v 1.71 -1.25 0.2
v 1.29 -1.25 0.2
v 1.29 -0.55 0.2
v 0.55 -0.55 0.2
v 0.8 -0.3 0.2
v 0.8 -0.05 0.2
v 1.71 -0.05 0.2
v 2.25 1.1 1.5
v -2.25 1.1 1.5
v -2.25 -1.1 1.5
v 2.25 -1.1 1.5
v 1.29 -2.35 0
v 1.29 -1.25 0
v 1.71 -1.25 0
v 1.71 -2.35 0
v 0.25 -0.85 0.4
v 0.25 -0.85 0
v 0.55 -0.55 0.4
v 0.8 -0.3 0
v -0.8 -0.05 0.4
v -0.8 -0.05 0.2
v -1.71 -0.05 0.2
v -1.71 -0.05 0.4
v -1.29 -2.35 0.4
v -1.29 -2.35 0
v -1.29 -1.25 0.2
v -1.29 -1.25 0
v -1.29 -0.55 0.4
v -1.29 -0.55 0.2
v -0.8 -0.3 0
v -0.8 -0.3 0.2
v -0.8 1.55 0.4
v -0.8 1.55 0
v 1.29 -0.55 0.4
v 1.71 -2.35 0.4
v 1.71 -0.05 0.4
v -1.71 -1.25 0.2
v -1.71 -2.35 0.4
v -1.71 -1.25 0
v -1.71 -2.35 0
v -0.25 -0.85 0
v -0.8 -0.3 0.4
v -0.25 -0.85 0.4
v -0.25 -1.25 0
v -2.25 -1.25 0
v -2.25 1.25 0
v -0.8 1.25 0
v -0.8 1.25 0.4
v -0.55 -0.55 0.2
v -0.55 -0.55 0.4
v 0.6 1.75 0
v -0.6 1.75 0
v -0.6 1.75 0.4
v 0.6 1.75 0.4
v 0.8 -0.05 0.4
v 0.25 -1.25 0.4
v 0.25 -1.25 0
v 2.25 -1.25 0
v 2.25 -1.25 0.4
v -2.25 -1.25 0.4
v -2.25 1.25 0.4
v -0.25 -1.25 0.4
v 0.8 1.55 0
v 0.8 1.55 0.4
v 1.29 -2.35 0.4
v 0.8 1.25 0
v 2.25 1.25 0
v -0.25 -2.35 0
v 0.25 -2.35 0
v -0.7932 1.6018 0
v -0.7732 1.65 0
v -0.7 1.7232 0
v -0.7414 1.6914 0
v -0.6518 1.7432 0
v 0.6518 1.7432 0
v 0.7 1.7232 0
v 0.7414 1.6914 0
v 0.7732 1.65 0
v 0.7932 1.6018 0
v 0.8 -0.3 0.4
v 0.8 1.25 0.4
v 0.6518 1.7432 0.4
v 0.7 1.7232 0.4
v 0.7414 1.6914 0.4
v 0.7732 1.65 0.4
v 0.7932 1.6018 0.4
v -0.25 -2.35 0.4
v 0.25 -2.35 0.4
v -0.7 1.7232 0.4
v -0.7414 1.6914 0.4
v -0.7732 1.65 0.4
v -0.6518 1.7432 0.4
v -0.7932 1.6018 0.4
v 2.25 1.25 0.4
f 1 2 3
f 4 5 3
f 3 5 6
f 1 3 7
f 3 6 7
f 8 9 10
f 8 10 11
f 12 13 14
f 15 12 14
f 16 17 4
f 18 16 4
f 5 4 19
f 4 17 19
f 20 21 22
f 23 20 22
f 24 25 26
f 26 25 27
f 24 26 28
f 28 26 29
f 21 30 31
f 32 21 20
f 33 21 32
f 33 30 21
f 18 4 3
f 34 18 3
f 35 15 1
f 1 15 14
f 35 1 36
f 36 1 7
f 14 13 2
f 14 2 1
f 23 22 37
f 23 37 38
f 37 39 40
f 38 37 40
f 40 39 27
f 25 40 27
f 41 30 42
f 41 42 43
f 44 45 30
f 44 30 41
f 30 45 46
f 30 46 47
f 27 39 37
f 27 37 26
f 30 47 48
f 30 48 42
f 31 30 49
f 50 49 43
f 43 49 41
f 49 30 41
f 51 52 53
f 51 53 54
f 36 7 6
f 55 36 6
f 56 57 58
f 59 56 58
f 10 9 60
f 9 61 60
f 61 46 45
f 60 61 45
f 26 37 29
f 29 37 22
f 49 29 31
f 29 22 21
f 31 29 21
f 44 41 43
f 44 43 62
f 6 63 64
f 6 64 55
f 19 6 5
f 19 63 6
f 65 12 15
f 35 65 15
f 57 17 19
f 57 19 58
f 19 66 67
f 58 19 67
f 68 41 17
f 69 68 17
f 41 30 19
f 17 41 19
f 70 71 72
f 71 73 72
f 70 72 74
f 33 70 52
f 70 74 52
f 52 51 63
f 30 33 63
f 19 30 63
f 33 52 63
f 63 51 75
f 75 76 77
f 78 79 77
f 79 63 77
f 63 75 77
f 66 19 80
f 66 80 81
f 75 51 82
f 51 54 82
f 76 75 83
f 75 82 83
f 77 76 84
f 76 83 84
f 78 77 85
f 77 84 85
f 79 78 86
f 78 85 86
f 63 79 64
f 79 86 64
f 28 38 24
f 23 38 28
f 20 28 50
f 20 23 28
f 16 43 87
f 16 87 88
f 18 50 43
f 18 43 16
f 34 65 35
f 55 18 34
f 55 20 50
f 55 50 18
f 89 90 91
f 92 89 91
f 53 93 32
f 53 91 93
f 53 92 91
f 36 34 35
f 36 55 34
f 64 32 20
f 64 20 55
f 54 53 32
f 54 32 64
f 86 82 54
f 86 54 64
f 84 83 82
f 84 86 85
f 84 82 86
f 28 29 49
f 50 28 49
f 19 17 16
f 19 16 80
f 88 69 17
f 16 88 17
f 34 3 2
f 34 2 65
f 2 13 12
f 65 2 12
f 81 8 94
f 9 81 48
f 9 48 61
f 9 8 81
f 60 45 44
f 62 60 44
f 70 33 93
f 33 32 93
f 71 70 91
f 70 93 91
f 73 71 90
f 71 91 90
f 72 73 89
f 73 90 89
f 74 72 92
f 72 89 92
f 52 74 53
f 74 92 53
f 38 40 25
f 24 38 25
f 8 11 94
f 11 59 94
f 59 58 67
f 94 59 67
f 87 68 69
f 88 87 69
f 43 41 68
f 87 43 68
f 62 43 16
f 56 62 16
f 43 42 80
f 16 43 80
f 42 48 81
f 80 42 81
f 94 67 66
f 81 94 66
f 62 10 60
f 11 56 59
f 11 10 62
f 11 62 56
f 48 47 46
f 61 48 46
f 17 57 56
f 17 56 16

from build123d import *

# Parameters (mm, degrees)
F4_W       = 0.42
F4_H       = 1.1
F4_W_2     = 0.5
F4_H_2     = 0.7
F4_H_3     = 0.25
F4_W_3     = 1.6
F4_H_4     = 1.3
F4_H_5     = 0.5
F5_DEPTH   = 0.4
F6_DEPTH   = 0.2
F7_R       = 0.2
F8_DEPTH   = 1.5
F9_SIZE2   = 0.15
F9_SIZE    = 1.1
F9_2_SIZE2 = 0.15
F9_2_SIZE  = 1.1
F10_DEPTH  = 0.4


with BuildPart() as f5:
    # F4 (on Top) → F5 (new body)
    with BuildSketch(Plane.XY):
        with Locations((1.5, -1.8)):
            Rectangle(F4_W, F4_H)
        with Locations((0, -1.8)):
            Rectangle(F4_W_2, F4_H)
        with Locations((1.5, -0.9)):
            Rectangle(F4_W, F4_H_2)
        Polygon((0.55, -0.55), (1.29, -0.55), (1.29, -0.3), (1.71, -0.3), (1.71, -0.05), (0.8, -0.05), (0.8, -0.3), align=None)
        with Locations((1.5, -0.425)):
            Rectangle(F4_W, F4_H_3)
        with Locations((0, 0.6)):
            Rectangle(F4_W_3, F4_H_4)
        Polygon((-0.25, -1.25), (0.25, -1.25), (0.25, -0.85), (0.25, -0.55), (-0.25, -0.55), (-0.25, -0.85), align=None)
        with Locations((0, -0.425)):
            Rectangle(F4_W_2, F4_H_3)
        Polygon((0.8, -0.3), (0.8, -0.05), (-0.8, -0.05), (-0.8, -0.3), (-0.25, -0.3), (0.25, -0.3), align=None)
        with Locations((-1.5, -0.9)):
            Rectangle(F4_W, F4_H_2)
        with Locations((-1.5, -0.425)):
            Rectangle(F4_W, F4_H_3)
        Polygon((-0.8, -0.3), (-0.8, -0.05), (-1.71, -0.05), (-1.71, -0.3), (-1.29, -0.3), (-1.29, -0.55), (-0.55, -0.55), align=None)
        with Locations((-1.5, -1.8)):
            Rectangle(F4_W, F4_H)
        Polygon((-0.25, -0.3), (-0.8, -0.3), (-0.55, -0.55), (-0.25, -0.55), align=None)
        Polygon((-0.55, -0.55), (-0.25, -0.85), (-0.25, -0.55), align=None)
        Polygon((0.25, -0.55), (0.25, -0.85), (0.55, -0.55), align=None)
        Polygon((0.25, -0.55), (0.55, -0.55), (0.8, -0.3), (0.25, -0.3), align=None)
        with Locations((0, 1.5)):
            Rectangle(F4_W_3, F4_H_5)
    extrude(amount=F5_DEPTH)

    # F4 (on Top) → F6 (cut)
    with BuildSketch(Plane.XY):
        with Locations((1.5, -0.9)):
            Rectangle(F4_W, F4_H_2)
        with Locations((1.5, -0.425)):
            Rectangle(F4_W, F4_H_3)
        Polygon((0.55, -0.55), (1.29, -0.55), (1.29, -0.3), (1.71, -0.3), (1.71, -0.05), (0.8, -0.05), (0.8, -0.3), align=None)
        with Locations((-1.5, -0.9)):
            Rectangle(F4_W, F4_H_2)
        with Locations((-1.5, -0.425)):
            Rectangle(F4_W, F4_H_3)
        Polygon((-0.8, -0.3), (-0.8, -0.05), (-1.71, -0.05), (-1.71, -0.3), (-1.29, -0.3), (-1.29, -0.55), (-0.55, -0.55), align=None)
    extrude(amount=F6_DEPTH, mode=Mode.SUBTRACT)

    # F7
    f7_edges = [f5.edges().sort_by_distance(p)[0] for p in [
        (0.8, 1.75, 0.2),
        (-0.8, 1.75, 0.2),
    ]]
    fillet(f7_edges, radius=F7_R)


with BuildPart() as f8:
    # F4 (on Top) → F8 (new body)
    with BuildSketch(Plane.XY):
        Polygon((-0.8, -0.05), (-0.8, 1.25), (-2.25, 1.25), (-2.25, -1.25), (-1.71, -1.25), (-1.71, -0.55), (-1.71, -0.3), (-1.71, -0.05), align=None)
        Polygon((1.71, -1.25), (2.25, -1.25), (2.25, 1.25), (0.8, 1.25), (0.8, -0.05), (1.71, -0.05), (1.71, -0.3), (1.71, -0.55), align=None)
        with Locations((0, 0.6)):
            Rectangle(F4_W_3, F4_H_4)
        Polygon((-1.29, -1.25), (-0.25, -1.25), (-0.25, -0.85), (-0.55, -0.55), (-1.29, -0.55), align=None)
        Polygon((0.25, -1.25), (1.29, -1.25), (1.29, -0.55), (0.55, -0.55), (0.25, -0.85), align=None)
        with Locations((-1.5, -0.9)):
            Rectangle(F4_W, F4_H_2)
        with Locations((-1.5, -0.425)):
            Rectangle(F4_W, F4_H_3)
        Polygon((-0.8, -0.3), (-0.8, -0.05), (-1.71, -0.05), (-1.71, -0.3), (-1.29, -0.3), (-1.29, -0.55), (-0.55, -0.55), align=None)
        Polygon((0.8, -0.3), (0.8, -0.05), (-0.8, -0.05), (-0.8, -0.3), (-0.25, -0.3), (0.25, -0.3), align=None)
        Polygon((-0.25, -0.3), (-0.8, -0.3), (-0.55, -0.55), (-0.25, -0.55), align=None)
        Polygon((-0.25, -1.25), (0.25, -1.25), (0.25, -0.85), (0.25, -0.55), (-0.25, -0.55), (-0.25, -0.85), align=None)
        Polygon((-0.55, -0.55), (-0.25, -0.85), (-0.25, -0.55), align=None)
        with Locations((0, -0.425)):
            Rectangle(F4_W_2, F4_H_3)
        Polygon((0.25, -0.55), (0.55, -0.55), (0.8, -0.3), (0.25, -0.3), align=None)
        Polygon((0.55, -0.55), (1.29, -0.55), (1.29, -0.3), (1.71, -0.3), (1.71, -0.05), (0.8, -0.05), (0.8, -0.3), align=None)
        Polygon((0.25, -0.55), (0.25, -0.85), (0.55, -0.55), align=None)
        with Locations((1.5, -0.9)):
            Rectangle(F4_W, F4_H_2)
        with Locations((1.5, -0.425)):
            Rectangle(F4_W, F4_H_3)
    extrude(amount=F8_DEPTH)

    # F9
    f9_edges = [f8.edges().sort_by_distance(p)[0] for p in [
        (0, 1.25, 1.5),
    ]]
    f9_side = f8.faces().sort_by_distance((0, 1.25, 0.75))[0]
    chamfer(f9_edges, length=F9_SIZE, length2=F9_SIZE2, reference=f9_side)

    # F9#2
    f9_2_edges = [f8.edges().sort_by_distance(p)[0] for p in [
        (0, -1.25, 1.5),
    ]]
    f9_2_side = f8.faces().sort_by_distance((0, -1.25, 0.75))[0]
    chamfer(f9_2_edges, length=F9_2_SIZE, length2=F9_2_SIZE2, reference=f9_2_side)

    # F4 (on Top) → F10 (cut)
    with BuildSketch(Plane.XY):
        with Locations((0, 0.6)):
            Rectangle(F4_W_3, F4_H_4)
        Polygon((0.8, -0.3), (0.8, -0.05), (-0.8, -0.05), (-0.8, -0.3), (-0.25, -0.3), (0.25, -0.3), align=None)
        Polygon((-0.25, -0.3), (-0.8, -0.3), (-0.55, -0.55), (-0.25, -0.55), align=None)
        Polygon((-0.55, -0.55), (-0.25, -0.85), (-0.25, -0.55), align=None)
        Polygon((-0.25, -1.25), (0.25, -1.25), (0.25, -0.85), (0.25, -0.55), (-0.25, -0.55), (-0.25, -0.85), align=None)
        with Locations((0, -0.425)):
            Rectangle(F4_W_2, F4_H_3)
        Polygon((0.25, -0.55), (0.55, -0.55), (0.8, -0.3), (0.25, -0.3), align=None)
        Polygon((0.25, -0.55), (0.25, -0.85), (0.55, -0.55), align=None)
    extrude(amount=F10_DEPTH, mode=Mode.SUBTRACT)


solid = Compound([f5.part, f8.part])
